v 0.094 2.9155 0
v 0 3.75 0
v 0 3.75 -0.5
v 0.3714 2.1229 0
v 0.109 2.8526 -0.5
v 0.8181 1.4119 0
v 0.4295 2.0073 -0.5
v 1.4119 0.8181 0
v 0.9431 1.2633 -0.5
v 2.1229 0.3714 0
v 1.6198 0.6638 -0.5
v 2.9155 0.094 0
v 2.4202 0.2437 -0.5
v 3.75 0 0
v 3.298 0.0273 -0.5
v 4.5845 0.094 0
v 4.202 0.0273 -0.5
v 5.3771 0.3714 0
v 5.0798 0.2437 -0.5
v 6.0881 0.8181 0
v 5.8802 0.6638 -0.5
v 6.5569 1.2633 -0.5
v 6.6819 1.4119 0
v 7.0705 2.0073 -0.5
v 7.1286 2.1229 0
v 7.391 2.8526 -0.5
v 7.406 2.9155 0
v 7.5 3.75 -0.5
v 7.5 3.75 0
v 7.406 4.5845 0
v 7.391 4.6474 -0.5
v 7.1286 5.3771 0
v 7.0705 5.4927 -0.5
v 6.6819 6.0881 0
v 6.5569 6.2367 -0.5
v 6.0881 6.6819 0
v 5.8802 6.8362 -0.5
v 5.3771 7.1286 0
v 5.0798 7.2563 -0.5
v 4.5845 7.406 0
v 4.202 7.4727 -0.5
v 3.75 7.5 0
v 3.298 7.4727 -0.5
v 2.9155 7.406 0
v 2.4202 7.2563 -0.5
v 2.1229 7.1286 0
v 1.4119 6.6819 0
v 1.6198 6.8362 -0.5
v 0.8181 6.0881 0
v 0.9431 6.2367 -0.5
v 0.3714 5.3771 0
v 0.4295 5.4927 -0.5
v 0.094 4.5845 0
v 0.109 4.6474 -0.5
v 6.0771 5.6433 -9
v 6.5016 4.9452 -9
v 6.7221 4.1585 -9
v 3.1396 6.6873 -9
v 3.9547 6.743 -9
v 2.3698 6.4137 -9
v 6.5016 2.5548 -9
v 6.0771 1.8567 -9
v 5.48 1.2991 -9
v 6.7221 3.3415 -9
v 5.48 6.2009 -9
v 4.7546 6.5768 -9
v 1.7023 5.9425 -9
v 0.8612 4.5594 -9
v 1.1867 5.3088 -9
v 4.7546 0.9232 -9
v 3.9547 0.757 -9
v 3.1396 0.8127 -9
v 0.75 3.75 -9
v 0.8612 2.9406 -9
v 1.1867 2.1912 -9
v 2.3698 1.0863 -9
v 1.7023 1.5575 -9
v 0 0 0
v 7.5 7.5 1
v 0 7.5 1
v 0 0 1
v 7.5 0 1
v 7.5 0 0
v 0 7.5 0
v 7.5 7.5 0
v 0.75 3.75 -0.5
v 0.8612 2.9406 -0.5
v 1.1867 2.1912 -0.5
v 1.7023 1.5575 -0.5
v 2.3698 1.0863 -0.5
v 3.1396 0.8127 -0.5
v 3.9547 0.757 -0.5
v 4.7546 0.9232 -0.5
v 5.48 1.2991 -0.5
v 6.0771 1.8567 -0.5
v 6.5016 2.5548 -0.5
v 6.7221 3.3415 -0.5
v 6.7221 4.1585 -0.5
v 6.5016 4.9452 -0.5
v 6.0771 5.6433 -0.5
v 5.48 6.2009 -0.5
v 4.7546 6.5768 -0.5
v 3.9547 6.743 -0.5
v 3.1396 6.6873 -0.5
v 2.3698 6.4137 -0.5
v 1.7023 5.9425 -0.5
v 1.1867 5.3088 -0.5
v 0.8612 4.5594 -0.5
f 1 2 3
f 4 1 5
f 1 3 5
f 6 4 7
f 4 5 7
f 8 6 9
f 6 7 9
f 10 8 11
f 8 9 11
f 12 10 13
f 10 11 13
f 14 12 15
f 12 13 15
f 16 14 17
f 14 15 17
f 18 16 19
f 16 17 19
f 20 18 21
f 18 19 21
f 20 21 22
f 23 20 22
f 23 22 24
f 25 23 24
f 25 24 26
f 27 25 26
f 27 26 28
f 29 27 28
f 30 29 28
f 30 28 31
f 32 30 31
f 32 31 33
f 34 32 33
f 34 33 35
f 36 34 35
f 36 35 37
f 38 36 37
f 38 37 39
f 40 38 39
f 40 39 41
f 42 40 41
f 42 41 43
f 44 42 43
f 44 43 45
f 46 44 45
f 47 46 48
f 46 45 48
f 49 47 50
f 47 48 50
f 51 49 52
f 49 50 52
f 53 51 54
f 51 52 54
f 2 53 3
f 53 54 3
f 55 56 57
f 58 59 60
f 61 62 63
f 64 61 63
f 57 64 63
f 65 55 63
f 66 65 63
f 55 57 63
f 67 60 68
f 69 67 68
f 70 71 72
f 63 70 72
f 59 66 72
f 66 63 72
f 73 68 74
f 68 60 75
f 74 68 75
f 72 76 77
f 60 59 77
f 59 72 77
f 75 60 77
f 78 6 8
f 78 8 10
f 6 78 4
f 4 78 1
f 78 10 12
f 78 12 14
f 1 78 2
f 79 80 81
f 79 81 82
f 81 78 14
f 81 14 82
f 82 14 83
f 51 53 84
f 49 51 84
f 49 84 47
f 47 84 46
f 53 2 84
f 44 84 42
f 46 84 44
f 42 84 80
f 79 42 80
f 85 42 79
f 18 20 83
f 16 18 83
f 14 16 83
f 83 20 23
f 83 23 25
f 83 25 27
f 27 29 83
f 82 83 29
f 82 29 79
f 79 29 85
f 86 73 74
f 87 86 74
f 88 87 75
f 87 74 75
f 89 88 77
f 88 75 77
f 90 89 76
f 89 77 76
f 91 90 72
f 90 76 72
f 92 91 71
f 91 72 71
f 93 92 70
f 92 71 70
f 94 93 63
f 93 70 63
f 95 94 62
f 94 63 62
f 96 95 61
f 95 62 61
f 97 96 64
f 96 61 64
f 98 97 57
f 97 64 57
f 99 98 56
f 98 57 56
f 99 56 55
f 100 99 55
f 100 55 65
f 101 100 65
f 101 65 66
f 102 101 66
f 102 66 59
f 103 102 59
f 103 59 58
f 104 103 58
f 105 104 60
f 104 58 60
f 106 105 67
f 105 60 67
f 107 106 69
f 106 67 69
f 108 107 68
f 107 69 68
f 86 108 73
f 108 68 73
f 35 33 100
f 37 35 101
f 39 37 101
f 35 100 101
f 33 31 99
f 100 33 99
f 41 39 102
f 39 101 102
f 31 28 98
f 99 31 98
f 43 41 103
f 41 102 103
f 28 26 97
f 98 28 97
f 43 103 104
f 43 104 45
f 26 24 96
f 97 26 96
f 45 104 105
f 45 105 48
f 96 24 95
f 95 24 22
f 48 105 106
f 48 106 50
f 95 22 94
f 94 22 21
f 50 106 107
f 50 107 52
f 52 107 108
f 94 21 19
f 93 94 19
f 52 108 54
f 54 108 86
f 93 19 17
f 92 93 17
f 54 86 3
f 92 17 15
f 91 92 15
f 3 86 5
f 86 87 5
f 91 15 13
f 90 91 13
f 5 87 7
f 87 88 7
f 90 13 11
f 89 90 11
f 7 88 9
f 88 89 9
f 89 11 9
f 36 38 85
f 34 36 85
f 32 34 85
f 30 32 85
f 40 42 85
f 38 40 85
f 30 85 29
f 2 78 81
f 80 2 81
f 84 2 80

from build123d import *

# Parameters (mm, degrees)
CIRCLE_R         = 3.75
EXTRUDE001_DEPTH = 1.5
CIRCLE001_R      = 3
EXTRUDE_DEPTH    = 10
BOX_W            = 7.5
BOX_H            = 7.5
BOX_DEPTH        = 1


with BuildPart() as extrude001:
    # Circle → Extrude001 (new body)
    with BuildSketch(Plane(origin=(3.75, 3.75, 1), x_dir=(-1, 0, 0), z_dir=(0, 0, 1))):
        Circle(CIRCLE_R)
    extrude(amount=EXTRUDE001_DEPTH)


with BuildPart() as extrude001_1:
    # Extrude001 placement: moved
    add(extrude001.part.moved(Location((0, 0, -1.5))))


with BuildPart() as fusion:
    # Circle001 → Extrude (new body)
    with BuildSketch(Plane(origin=(3.75, 3.75, 1), x_dir=(-1, 0, 0), z_dir=(0, 0, 1))):
        Circle(CIRCLE001_R)
    extrude(amount=EXTRUDE_DEPTH)


with BuildPart() as fusion_1:
    # Extrude placement: moved
    add(fusion.part.moved(Location((0, 0, -10))))

    # Fusion: union Extrude001
    add(extrude001_1.part)


with BuildPart() as perforador_led_4_mm:
    # Box → Box (new body)
    with BuildSketch(Plane.XY):
        with Locations((3.75, 3.75)):
            Rectangle(BOX_W, BOX_H)
    extrude(amount=BOX_DEPTH)

    # Fusion001: union Fusion
    add(fusion_1.part)


solid = perforador_led_4_mm.part
